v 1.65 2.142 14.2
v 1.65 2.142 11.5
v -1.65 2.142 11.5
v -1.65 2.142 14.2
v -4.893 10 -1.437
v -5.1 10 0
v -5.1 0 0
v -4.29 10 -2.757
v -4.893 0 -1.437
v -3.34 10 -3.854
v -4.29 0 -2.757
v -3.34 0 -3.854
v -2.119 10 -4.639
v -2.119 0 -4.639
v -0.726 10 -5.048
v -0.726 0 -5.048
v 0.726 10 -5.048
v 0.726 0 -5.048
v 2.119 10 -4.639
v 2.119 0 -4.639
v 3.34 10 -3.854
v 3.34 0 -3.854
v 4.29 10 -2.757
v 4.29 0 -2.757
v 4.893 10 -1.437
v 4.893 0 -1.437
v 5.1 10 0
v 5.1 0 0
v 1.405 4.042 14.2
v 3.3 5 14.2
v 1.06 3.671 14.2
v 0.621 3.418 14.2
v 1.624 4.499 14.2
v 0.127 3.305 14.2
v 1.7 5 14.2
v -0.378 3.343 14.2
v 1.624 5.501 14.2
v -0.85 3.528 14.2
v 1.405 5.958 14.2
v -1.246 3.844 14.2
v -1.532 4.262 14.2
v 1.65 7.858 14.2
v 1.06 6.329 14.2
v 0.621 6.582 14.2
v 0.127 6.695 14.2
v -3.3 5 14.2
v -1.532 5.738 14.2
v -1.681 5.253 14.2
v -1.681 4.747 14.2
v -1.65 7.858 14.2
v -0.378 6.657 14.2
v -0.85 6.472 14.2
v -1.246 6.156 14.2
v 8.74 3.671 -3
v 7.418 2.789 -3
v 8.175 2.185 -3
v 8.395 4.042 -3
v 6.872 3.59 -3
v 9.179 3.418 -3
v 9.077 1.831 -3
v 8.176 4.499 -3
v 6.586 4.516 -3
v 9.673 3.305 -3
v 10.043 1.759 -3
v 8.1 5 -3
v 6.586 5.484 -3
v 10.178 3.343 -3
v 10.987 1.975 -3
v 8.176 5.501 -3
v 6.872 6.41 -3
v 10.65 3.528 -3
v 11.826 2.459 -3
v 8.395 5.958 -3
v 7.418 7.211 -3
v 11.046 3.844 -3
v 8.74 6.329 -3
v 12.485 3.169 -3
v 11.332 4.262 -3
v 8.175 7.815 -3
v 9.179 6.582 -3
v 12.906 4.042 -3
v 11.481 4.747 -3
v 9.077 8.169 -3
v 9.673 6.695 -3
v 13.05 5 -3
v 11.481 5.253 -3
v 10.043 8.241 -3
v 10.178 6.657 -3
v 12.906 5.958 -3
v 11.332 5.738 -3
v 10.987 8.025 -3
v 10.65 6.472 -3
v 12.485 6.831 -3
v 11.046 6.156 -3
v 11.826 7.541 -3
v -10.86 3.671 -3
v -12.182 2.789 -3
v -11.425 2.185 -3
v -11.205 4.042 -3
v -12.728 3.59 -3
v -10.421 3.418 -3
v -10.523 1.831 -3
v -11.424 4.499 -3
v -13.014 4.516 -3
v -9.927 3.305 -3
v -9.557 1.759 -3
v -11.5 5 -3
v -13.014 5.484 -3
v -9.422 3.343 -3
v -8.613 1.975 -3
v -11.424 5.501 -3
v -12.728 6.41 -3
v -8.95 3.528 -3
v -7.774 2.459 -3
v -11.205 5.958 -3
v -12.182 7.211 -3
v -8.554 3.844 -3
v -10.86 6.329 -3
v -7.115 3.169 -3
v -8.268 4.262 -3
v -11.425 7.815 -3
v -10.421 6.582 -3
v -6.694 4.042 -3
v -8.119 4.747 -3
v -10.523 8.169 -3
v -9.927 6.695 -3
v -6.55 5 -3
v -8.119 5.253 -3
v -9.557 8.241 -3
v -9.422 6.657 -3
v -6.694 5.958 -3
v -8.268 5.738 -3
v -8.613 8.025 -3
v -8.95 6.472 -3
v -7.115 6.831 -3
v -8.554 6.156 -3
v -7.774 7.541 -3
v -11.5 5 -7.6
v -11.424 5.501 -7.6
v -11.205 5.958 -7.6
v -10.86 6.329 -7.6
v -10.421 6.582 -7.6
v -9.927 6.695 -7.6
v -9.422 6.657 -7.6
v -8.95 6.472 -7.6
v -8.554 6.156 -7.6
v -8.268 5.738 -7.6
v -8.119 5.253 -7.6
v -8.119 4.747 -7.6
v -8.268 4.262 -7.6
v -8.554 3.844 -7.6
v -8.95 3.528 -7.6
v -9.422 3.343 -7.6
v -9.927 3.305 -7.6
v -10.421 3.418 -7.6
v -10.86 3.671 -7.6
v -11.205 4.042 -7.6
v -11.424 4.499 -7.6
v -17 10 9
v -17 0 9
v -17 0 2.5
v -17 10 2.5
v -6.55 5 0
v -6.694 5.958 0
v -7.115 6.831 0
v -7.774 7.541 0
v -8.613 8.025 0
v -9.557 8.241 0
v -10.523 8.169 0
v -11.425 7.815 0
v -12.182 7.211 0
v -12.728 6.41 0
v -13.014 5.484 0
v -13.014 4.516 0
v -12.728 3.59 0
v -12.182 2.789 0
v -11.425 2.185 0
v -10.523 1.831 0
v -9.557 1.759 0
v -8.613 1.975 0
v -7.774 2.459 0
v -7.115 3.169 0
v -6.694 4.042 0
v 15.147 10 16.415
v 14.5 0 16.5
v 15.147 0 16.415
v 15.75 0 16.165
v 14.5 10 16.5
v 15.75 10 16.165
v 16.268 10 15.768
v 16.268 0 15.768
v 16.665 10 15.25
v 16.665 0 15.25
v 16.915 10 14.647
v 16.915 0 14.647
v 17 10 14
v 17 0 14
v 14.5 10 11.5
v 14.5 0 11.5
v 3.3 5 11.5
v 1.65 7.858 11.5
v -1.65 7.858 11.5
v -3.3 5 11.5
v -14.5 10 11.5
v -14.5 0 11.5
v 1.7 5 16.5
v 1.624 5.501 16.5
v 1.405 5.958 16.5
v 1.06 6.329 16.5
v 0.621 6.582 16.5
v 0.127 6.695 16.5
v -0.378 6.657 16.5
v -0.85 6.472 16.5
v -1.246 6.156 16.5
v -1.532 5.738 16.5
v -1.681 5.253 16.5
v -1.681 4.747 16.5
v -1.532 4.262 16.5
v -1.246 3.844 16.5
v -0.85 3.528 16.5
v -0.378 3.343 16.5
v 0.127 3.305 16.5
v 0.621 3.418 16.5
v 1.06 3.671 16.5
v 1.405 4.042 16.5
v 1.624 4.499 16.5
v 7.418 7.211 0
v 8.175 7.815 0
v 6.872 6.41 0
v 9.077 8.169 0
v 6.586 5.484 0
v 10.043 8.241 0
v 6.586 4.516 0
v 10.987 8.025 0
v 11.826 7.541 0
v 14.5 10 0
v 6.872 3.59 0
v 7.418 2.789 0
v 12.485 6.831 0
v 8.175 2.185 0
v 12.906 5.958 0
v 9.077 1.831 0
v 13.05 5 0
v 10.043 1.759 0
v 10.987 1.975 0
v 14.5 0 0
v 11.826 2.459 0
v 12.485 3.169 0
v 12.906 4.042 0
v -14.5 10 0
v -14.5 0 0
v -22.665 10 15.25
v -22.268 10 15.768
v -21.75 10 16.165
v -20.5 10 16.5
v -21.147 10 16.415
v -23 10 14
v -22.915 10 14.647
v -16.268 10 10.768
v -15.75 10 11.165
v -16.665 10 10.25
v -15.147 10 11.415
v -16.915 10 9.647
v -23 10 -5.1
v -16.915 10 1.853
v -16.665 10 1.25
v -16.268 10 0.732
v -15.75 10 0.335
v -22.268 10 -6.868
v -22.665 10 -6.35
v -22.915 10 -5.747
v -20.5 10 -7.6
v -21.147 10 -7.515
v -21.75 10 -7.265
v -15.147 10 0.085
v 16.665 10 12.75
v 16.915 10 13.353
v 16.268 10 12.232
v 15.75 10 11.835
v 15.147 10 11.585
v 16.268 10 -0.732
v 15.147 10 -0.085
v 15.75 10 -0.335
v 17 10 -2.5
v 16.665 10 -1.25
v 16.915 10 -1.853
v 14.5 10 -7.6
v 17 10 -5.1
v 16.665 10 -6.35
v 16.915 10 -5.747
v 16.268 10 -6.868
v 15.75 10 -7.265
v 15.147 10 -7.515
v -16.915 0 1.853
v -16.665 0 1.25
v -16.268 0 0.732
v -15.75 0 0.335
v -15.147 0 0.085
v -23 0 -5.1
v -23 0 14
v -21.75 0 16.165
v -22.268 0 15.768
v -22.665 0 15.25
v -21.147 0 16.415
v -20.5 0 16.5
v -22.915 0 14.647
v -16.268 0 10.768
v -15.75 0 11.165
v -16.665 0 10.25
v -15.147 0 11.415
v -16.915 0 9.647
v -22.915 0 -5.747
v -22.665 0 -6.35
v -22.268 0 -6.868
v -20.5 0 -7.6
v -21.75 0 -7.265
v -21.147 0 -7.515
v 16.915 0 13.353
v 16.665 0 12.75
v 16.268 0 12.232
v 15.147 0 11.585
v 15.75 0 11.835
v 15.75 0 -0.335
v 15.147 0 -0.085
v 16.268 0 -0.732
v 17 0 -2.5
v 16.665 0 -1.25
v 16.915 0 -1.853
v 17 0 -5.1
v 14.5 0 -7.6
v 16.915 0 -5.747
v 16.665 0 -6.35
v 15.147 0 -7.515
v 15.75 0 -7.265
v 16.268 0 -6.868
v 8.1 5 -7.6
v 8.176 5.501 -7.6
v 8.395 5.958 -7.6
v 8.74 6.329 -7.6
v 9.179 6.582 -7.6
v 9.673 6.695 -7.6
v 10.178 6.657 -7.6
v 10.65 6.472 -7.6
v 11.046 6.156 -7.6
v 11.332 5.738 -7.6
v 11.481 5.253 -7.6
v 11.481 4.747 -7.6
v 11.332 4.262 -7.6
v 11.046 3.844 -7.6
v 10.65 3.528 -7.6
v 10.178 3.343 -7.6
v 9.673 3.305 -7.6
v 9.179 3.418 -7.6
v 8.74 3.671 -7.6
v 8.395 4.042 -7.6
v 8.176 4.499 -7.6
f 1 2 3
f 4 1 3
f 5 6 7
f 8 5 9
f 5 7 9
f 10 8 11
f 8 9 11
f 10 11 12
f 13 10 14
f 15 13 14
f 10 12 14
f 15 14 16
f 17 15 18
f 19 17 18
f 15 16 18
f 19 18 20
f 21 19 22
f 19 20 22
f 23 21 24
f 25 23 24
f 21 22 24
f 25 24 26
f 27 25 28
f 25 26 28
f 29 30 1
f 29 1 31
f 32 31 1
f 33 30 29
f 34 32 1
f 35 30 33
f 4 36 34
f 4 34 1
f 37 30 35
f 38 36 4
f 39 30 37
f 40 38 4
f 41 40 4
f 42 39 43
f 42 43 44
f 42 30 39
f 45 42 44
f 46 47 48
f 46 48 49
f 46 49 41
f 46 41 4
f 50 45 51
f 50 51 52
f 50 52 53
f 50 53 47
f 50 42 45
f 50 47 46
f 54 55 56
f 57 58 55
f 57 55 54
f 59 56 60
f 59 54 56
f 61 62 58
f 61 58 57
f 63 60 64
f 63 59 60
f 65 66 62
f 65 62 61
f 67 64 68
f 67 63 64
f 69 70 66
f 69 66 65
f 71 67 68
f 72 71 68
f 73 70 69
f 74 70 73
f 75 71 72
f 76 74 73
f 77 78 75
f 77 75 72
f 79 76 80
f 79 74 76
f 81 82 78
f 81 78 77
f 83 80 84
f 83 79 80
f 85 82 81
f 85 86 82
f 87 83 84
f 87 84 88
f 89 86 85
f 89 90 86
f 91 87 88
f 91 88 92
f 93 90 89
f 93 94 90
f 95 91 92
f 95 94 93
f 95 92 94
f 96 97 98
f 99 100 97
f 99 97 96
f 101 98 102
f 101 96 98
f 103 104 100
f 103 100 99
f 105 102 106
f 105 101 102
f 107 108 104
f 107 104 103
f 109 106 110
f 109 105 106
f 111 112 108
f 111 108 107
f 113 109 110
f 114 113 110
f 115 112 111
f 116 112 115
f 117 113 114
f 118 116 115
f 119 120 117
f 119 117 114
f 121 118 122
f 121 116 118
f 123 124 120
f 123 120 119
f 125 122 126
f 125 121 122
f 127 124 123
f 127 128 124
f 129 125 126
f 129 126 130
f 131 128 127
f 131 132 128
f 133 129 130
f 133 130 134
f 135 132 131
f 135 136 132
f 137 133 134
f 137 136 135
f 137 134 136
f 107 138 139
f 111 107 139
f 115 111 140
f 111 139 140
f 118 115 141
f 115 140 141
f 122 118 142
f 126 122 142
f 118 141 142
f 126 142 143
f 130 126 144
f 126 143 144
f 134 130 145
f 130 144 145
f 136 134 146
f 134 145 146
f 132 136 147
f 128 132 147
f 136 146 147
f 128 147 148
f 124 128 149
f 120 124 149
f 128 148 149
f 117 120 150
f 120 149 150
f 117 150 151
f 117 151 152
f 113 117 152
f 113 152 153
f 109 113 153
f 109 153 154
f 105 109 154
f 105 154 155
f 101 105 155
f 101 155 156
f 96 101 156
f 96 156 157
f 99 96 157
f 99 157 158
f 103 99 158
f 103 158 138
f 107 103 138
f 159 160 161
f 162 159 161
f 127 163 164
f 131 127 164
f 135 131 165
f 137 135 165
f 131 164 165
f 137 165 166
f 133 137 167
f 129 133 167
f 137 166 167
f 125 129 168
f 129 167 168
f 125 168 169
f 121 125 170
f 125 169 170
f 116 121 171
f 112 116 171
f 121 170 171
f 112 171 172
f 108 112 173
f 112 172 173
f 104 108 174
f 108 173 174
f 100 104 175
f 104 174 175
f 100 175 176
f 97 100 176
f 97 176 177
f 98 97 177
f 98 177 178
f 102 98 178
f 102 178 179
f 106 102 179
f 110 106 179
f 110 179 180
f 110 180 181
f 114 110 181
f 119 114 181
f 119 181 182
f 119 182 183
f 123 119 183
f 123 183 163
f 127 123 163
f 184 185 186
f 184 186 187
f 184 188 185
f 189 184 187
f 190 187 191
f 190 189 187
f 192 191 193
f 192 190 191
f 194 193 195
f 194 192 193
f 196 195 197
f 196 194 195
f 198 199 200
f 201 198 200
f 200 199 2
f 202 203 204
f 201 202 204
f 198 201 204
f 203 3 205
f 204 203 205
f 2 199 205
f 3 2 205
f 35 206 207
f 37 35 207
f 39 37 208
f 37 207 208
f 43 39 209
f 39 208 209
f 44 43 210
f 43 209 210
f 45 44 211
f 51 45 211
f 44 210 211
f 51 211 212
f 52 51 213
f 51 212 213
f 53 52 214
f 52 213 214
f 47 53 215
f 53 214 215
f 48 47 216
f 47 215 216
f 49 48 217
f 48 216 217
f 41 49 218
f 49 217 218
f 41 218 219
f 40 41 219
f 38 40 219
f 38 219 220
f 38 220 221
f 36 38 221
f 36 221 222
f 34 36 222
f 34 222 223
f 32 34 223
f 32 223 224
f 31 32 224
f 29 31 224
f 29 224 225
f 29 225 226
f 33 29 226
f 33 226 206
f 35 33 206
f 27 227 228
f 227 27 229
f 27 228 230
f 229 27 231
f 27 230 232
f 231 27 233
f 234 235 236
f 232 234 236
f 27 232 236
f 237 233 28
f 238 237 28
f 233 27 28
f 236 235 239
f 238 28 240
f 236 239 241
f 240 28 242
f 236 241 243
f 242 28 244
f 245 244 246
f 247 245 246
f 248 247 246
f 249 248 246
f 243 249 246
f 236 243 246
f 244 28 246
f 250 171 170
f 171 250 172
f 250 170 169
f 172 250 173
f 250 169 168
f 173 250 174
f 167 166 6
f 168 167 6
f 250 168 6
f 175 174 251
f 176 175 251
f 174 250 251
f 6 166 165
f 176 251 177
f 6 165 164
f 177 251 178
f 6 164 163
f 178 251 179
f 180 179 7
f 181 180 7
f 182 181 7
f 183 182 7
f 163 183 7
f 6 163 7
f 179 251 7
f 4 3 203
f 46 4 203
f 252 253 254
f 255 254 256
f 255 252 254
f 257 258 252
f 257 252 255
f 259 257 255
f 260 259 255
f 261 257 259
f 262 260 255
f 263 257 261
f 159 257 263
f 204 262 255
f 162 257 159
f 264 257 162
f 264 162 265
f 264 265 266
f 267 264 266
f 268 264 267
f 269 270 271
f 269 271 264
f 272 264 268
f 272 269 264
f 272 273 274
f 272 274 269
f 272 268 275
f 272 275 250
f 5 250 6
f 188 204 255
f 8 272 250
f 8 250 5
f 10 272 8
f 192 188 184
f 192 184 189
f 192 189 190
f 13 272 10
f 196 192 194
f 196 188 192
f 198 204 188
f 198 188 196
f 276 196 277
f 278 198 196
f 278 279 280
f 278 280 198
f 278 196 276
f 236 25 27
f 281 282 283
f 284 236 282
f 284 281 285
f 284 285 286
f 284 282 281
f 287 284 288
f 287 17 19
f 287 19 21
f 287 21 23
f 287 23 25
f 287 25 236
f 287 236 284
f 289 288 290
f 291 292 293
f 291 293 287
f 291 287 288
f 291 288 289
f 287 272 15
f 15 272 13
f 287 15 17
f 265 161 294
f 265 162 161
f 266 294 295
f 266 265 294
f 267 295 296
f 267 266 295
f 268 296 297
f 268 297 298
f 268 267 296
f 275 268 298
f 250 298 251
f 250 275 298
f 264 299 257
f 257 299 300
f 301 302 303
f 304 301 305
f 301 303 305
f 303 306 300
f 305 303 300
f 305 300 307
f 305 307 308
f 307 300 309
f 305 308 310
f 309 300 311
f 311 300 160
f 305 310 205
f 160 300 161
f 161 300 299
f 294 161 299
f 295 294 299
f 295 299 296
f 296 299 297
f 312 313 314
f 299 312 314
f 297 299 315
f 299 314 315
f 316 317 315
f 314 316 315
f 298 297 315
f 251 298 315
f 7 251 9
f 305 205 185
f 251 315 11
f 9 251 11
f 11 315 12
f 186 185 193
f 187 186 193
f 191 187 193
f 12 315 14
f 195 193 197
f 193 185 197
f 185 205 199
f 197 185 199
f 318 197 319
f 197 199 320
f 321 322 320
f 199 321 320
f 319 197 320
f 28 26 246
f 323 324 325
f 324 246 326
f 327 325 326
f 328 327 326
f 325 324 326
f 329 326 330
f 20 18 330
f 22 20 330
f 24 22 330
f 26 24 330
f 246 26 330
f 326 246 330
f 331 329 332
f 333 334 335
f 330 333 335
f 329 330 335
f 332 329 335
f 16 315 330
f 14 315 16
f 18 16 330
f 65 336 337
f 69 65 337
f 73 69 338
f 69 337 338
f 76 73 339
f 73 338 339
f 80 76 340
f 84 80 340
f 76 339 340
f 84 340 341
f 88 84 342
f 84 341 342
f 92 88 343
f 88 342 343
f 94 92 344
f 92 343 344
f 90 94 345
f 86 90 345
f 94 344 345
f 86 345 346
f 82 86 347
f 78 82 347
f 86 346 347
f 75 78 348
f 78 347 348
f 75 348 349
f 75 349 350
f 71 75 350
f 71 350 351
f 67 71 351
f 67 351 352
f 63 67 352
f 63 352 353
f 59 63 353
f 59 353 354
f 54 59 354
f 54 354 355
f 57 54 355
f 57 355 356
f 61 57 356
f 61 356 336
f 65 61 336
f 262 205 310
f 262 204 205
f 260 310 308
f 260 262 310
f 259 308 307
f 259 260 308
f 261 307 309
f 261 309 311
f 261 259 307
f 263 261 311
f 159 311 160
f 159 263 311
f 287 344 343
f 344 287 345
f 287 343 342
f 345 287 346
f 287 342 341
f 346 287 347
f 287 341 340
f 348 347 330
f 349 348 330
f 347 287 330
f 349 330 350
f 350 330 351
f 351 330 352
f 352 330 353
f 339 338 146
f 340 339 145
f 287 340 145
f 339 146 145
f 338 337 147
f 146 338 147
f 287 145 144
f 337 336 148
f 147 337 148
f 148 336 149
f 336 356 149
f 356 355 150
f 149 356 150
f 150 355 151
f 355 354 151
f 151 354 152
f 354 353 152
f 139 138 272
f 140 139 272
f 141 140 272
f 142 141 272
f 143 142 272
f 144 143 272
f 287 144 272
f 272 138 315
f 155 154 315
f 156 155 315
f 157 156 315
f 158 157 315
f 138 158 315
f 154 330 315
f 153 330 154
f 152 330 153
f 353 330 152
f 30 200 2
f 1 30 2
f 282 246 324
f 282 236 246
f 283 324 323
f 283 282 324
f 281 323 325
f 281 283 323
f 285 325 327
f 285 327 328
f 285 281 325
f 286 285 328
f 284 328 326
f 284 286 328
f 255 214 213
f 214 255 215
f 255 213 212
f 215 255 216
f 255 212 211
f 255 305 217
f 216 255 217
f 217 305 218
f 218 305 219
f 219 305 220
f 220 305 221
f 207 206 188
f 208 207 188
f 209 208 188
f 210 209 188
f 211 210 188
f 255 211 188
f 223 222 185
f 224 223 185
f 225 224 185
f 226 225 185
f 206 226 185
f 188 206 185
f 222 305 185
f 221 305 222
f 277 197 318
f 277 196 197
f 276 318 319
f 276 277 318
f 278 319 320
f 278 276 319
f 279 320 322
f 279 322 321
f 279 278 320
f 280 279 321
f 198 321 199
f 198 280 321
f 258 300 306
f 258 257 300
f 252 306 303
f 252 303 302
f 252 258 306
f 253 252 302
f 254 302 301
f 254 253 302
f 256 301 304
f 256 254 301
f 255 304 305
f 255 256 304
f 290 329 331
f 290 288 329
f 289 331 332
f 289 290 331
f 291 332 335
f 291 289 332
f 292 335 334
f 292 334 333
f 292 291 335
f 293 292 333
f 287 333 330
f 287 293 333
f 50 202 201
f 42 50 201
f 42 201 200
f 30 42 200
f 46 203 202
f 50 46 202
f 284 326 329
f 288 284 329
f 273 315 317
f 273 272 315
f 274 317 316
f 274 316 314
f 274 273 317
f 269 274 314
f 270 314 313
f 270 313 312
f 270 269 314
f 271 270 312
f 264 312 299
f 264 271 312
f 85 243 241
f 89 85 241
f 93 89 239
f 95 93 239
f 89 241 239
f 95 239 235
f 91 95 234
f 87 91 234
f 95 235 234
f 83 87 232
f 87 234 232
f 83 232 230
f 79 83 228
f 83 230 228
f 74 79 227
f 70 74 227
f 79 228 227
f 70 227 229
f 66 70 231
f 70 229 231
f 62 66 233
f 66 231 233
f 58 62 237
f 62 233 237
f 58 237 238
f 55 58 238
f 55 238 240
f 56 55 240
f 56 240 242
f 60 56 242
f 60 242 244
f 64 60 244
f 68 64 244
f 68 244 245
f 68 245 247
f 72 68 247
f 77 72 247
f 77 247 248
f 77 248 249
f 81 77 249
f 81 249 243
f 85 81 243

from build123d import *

# Parameters (mm, degrees)
BOSS_EXTRUDE1_DEPTH            = 10
FILLET1_R                      = 2.5
CUT_EXTRUDE1_DEPTH             = 2.7
CBORE_FOR_M3_SHCS1_D           = 3.4
CBORE_FOR_M3_SHCS1_DEPTH       = 7.6
CBORE_FOR_M3_SHCS1_CBORE_D     = 6.5
CBORE_FOR_M3_SHCS1_CBORE_DEPTH = 3
M3_CLEARANCE_HOLE1_D           = 3.4
M3_CLEARANCE_HOLE1_DEPTH       = 2.3


with BuildPart() as part:
    # Sketch1 → Boss-Extrude1 (new body)
    with BuildSketch(Plane(origin=(0, 0, 0), x_dir=(1, 0, 0), z_dir=(0, 1, 0))):
        with BuildLine():
            Line((5.1, 0), (17, 0))
            Line((17, 0), (17, 7.6))
            Line((17, 7.6), (-23, 7.6))
            Line((-23, 7.6), (-23, -16.5))
            Line((-23, -16.5), (17, -16.5))
            Line((17, -16.5), (17, -11.5))
            Line((17, -11.5), (-17, -11.5))
            Line((-17, -11.5), (-17, 0))
            Line((-17, 0), (-5.1, 0))
            ThreePointArc((-5.1, 0), (0, 5.1), (5.1, 0))
        make_face()
    extrude(amount=BOSS_EXTRUDE1_DEPTH)

    # Fillet1
    fillet1_edges = [part.edges().sort_by_distance(p)[0] for p in [
        (-17, 5, 0),
        (-17, 5, 11.5),
        (17, 5, 11.5),
        (17, 5, 16.5),
        (-23, 5, 16.5),
        (-23, 5, -7.6),
        (17, 5, -7.6),
        (17, 5, 0),
    ]]
    fillet(fillet1_edges, radius=FILLET1_R - 0.0001)  # a hair under: the kernel refuses the full size

    # Sketch3 → Cut-Extrude1 (cut)
    with BuildSketch(Plane(origin=(0, 0, 11.5), x_dir=(-1, 0, 0), z_dir=(0, 0, -1))):
        Polygon((3.3, 5), (1.65, 7.857883832), (-1.65, 7.857883832), (-3.3, 5), (-1.65, 2.142116168), (1.65, 2.142116168), align=None)
    extrude(amount=-CUT_EXTRUDE1_DEPTH, mode=Mode.SUBTRACT)

    # CBORE for M3 SHCS1
    with Locations(Plane.XY):
        with Locations((-9.8, 5), (9.8, 5)):
            CounterBoreHole(CBORE_FOR_M3_SHCS1_D / 2, CBORE_FOR_M3_SHCS1_CBORE_D / 2, CBORE_FOR_M3_SHCS1_CBORE_DEPTH, depth=CBORE_FOR_M3_SHCS1_DEPTH)

    # M3 Clearance Hole1
    with Locations(Plane(origin=(0, 0, 14.2), x_dir=(-1, 0, 0), z_dir=(0, 0, -1))):
        with Locations((0, 5)):
            Hole(M3_CLEARANCE_HOLE1_D / 2, depth=M3_CLEARANCE_HOLE1_DEPTH)


solid = part.part
